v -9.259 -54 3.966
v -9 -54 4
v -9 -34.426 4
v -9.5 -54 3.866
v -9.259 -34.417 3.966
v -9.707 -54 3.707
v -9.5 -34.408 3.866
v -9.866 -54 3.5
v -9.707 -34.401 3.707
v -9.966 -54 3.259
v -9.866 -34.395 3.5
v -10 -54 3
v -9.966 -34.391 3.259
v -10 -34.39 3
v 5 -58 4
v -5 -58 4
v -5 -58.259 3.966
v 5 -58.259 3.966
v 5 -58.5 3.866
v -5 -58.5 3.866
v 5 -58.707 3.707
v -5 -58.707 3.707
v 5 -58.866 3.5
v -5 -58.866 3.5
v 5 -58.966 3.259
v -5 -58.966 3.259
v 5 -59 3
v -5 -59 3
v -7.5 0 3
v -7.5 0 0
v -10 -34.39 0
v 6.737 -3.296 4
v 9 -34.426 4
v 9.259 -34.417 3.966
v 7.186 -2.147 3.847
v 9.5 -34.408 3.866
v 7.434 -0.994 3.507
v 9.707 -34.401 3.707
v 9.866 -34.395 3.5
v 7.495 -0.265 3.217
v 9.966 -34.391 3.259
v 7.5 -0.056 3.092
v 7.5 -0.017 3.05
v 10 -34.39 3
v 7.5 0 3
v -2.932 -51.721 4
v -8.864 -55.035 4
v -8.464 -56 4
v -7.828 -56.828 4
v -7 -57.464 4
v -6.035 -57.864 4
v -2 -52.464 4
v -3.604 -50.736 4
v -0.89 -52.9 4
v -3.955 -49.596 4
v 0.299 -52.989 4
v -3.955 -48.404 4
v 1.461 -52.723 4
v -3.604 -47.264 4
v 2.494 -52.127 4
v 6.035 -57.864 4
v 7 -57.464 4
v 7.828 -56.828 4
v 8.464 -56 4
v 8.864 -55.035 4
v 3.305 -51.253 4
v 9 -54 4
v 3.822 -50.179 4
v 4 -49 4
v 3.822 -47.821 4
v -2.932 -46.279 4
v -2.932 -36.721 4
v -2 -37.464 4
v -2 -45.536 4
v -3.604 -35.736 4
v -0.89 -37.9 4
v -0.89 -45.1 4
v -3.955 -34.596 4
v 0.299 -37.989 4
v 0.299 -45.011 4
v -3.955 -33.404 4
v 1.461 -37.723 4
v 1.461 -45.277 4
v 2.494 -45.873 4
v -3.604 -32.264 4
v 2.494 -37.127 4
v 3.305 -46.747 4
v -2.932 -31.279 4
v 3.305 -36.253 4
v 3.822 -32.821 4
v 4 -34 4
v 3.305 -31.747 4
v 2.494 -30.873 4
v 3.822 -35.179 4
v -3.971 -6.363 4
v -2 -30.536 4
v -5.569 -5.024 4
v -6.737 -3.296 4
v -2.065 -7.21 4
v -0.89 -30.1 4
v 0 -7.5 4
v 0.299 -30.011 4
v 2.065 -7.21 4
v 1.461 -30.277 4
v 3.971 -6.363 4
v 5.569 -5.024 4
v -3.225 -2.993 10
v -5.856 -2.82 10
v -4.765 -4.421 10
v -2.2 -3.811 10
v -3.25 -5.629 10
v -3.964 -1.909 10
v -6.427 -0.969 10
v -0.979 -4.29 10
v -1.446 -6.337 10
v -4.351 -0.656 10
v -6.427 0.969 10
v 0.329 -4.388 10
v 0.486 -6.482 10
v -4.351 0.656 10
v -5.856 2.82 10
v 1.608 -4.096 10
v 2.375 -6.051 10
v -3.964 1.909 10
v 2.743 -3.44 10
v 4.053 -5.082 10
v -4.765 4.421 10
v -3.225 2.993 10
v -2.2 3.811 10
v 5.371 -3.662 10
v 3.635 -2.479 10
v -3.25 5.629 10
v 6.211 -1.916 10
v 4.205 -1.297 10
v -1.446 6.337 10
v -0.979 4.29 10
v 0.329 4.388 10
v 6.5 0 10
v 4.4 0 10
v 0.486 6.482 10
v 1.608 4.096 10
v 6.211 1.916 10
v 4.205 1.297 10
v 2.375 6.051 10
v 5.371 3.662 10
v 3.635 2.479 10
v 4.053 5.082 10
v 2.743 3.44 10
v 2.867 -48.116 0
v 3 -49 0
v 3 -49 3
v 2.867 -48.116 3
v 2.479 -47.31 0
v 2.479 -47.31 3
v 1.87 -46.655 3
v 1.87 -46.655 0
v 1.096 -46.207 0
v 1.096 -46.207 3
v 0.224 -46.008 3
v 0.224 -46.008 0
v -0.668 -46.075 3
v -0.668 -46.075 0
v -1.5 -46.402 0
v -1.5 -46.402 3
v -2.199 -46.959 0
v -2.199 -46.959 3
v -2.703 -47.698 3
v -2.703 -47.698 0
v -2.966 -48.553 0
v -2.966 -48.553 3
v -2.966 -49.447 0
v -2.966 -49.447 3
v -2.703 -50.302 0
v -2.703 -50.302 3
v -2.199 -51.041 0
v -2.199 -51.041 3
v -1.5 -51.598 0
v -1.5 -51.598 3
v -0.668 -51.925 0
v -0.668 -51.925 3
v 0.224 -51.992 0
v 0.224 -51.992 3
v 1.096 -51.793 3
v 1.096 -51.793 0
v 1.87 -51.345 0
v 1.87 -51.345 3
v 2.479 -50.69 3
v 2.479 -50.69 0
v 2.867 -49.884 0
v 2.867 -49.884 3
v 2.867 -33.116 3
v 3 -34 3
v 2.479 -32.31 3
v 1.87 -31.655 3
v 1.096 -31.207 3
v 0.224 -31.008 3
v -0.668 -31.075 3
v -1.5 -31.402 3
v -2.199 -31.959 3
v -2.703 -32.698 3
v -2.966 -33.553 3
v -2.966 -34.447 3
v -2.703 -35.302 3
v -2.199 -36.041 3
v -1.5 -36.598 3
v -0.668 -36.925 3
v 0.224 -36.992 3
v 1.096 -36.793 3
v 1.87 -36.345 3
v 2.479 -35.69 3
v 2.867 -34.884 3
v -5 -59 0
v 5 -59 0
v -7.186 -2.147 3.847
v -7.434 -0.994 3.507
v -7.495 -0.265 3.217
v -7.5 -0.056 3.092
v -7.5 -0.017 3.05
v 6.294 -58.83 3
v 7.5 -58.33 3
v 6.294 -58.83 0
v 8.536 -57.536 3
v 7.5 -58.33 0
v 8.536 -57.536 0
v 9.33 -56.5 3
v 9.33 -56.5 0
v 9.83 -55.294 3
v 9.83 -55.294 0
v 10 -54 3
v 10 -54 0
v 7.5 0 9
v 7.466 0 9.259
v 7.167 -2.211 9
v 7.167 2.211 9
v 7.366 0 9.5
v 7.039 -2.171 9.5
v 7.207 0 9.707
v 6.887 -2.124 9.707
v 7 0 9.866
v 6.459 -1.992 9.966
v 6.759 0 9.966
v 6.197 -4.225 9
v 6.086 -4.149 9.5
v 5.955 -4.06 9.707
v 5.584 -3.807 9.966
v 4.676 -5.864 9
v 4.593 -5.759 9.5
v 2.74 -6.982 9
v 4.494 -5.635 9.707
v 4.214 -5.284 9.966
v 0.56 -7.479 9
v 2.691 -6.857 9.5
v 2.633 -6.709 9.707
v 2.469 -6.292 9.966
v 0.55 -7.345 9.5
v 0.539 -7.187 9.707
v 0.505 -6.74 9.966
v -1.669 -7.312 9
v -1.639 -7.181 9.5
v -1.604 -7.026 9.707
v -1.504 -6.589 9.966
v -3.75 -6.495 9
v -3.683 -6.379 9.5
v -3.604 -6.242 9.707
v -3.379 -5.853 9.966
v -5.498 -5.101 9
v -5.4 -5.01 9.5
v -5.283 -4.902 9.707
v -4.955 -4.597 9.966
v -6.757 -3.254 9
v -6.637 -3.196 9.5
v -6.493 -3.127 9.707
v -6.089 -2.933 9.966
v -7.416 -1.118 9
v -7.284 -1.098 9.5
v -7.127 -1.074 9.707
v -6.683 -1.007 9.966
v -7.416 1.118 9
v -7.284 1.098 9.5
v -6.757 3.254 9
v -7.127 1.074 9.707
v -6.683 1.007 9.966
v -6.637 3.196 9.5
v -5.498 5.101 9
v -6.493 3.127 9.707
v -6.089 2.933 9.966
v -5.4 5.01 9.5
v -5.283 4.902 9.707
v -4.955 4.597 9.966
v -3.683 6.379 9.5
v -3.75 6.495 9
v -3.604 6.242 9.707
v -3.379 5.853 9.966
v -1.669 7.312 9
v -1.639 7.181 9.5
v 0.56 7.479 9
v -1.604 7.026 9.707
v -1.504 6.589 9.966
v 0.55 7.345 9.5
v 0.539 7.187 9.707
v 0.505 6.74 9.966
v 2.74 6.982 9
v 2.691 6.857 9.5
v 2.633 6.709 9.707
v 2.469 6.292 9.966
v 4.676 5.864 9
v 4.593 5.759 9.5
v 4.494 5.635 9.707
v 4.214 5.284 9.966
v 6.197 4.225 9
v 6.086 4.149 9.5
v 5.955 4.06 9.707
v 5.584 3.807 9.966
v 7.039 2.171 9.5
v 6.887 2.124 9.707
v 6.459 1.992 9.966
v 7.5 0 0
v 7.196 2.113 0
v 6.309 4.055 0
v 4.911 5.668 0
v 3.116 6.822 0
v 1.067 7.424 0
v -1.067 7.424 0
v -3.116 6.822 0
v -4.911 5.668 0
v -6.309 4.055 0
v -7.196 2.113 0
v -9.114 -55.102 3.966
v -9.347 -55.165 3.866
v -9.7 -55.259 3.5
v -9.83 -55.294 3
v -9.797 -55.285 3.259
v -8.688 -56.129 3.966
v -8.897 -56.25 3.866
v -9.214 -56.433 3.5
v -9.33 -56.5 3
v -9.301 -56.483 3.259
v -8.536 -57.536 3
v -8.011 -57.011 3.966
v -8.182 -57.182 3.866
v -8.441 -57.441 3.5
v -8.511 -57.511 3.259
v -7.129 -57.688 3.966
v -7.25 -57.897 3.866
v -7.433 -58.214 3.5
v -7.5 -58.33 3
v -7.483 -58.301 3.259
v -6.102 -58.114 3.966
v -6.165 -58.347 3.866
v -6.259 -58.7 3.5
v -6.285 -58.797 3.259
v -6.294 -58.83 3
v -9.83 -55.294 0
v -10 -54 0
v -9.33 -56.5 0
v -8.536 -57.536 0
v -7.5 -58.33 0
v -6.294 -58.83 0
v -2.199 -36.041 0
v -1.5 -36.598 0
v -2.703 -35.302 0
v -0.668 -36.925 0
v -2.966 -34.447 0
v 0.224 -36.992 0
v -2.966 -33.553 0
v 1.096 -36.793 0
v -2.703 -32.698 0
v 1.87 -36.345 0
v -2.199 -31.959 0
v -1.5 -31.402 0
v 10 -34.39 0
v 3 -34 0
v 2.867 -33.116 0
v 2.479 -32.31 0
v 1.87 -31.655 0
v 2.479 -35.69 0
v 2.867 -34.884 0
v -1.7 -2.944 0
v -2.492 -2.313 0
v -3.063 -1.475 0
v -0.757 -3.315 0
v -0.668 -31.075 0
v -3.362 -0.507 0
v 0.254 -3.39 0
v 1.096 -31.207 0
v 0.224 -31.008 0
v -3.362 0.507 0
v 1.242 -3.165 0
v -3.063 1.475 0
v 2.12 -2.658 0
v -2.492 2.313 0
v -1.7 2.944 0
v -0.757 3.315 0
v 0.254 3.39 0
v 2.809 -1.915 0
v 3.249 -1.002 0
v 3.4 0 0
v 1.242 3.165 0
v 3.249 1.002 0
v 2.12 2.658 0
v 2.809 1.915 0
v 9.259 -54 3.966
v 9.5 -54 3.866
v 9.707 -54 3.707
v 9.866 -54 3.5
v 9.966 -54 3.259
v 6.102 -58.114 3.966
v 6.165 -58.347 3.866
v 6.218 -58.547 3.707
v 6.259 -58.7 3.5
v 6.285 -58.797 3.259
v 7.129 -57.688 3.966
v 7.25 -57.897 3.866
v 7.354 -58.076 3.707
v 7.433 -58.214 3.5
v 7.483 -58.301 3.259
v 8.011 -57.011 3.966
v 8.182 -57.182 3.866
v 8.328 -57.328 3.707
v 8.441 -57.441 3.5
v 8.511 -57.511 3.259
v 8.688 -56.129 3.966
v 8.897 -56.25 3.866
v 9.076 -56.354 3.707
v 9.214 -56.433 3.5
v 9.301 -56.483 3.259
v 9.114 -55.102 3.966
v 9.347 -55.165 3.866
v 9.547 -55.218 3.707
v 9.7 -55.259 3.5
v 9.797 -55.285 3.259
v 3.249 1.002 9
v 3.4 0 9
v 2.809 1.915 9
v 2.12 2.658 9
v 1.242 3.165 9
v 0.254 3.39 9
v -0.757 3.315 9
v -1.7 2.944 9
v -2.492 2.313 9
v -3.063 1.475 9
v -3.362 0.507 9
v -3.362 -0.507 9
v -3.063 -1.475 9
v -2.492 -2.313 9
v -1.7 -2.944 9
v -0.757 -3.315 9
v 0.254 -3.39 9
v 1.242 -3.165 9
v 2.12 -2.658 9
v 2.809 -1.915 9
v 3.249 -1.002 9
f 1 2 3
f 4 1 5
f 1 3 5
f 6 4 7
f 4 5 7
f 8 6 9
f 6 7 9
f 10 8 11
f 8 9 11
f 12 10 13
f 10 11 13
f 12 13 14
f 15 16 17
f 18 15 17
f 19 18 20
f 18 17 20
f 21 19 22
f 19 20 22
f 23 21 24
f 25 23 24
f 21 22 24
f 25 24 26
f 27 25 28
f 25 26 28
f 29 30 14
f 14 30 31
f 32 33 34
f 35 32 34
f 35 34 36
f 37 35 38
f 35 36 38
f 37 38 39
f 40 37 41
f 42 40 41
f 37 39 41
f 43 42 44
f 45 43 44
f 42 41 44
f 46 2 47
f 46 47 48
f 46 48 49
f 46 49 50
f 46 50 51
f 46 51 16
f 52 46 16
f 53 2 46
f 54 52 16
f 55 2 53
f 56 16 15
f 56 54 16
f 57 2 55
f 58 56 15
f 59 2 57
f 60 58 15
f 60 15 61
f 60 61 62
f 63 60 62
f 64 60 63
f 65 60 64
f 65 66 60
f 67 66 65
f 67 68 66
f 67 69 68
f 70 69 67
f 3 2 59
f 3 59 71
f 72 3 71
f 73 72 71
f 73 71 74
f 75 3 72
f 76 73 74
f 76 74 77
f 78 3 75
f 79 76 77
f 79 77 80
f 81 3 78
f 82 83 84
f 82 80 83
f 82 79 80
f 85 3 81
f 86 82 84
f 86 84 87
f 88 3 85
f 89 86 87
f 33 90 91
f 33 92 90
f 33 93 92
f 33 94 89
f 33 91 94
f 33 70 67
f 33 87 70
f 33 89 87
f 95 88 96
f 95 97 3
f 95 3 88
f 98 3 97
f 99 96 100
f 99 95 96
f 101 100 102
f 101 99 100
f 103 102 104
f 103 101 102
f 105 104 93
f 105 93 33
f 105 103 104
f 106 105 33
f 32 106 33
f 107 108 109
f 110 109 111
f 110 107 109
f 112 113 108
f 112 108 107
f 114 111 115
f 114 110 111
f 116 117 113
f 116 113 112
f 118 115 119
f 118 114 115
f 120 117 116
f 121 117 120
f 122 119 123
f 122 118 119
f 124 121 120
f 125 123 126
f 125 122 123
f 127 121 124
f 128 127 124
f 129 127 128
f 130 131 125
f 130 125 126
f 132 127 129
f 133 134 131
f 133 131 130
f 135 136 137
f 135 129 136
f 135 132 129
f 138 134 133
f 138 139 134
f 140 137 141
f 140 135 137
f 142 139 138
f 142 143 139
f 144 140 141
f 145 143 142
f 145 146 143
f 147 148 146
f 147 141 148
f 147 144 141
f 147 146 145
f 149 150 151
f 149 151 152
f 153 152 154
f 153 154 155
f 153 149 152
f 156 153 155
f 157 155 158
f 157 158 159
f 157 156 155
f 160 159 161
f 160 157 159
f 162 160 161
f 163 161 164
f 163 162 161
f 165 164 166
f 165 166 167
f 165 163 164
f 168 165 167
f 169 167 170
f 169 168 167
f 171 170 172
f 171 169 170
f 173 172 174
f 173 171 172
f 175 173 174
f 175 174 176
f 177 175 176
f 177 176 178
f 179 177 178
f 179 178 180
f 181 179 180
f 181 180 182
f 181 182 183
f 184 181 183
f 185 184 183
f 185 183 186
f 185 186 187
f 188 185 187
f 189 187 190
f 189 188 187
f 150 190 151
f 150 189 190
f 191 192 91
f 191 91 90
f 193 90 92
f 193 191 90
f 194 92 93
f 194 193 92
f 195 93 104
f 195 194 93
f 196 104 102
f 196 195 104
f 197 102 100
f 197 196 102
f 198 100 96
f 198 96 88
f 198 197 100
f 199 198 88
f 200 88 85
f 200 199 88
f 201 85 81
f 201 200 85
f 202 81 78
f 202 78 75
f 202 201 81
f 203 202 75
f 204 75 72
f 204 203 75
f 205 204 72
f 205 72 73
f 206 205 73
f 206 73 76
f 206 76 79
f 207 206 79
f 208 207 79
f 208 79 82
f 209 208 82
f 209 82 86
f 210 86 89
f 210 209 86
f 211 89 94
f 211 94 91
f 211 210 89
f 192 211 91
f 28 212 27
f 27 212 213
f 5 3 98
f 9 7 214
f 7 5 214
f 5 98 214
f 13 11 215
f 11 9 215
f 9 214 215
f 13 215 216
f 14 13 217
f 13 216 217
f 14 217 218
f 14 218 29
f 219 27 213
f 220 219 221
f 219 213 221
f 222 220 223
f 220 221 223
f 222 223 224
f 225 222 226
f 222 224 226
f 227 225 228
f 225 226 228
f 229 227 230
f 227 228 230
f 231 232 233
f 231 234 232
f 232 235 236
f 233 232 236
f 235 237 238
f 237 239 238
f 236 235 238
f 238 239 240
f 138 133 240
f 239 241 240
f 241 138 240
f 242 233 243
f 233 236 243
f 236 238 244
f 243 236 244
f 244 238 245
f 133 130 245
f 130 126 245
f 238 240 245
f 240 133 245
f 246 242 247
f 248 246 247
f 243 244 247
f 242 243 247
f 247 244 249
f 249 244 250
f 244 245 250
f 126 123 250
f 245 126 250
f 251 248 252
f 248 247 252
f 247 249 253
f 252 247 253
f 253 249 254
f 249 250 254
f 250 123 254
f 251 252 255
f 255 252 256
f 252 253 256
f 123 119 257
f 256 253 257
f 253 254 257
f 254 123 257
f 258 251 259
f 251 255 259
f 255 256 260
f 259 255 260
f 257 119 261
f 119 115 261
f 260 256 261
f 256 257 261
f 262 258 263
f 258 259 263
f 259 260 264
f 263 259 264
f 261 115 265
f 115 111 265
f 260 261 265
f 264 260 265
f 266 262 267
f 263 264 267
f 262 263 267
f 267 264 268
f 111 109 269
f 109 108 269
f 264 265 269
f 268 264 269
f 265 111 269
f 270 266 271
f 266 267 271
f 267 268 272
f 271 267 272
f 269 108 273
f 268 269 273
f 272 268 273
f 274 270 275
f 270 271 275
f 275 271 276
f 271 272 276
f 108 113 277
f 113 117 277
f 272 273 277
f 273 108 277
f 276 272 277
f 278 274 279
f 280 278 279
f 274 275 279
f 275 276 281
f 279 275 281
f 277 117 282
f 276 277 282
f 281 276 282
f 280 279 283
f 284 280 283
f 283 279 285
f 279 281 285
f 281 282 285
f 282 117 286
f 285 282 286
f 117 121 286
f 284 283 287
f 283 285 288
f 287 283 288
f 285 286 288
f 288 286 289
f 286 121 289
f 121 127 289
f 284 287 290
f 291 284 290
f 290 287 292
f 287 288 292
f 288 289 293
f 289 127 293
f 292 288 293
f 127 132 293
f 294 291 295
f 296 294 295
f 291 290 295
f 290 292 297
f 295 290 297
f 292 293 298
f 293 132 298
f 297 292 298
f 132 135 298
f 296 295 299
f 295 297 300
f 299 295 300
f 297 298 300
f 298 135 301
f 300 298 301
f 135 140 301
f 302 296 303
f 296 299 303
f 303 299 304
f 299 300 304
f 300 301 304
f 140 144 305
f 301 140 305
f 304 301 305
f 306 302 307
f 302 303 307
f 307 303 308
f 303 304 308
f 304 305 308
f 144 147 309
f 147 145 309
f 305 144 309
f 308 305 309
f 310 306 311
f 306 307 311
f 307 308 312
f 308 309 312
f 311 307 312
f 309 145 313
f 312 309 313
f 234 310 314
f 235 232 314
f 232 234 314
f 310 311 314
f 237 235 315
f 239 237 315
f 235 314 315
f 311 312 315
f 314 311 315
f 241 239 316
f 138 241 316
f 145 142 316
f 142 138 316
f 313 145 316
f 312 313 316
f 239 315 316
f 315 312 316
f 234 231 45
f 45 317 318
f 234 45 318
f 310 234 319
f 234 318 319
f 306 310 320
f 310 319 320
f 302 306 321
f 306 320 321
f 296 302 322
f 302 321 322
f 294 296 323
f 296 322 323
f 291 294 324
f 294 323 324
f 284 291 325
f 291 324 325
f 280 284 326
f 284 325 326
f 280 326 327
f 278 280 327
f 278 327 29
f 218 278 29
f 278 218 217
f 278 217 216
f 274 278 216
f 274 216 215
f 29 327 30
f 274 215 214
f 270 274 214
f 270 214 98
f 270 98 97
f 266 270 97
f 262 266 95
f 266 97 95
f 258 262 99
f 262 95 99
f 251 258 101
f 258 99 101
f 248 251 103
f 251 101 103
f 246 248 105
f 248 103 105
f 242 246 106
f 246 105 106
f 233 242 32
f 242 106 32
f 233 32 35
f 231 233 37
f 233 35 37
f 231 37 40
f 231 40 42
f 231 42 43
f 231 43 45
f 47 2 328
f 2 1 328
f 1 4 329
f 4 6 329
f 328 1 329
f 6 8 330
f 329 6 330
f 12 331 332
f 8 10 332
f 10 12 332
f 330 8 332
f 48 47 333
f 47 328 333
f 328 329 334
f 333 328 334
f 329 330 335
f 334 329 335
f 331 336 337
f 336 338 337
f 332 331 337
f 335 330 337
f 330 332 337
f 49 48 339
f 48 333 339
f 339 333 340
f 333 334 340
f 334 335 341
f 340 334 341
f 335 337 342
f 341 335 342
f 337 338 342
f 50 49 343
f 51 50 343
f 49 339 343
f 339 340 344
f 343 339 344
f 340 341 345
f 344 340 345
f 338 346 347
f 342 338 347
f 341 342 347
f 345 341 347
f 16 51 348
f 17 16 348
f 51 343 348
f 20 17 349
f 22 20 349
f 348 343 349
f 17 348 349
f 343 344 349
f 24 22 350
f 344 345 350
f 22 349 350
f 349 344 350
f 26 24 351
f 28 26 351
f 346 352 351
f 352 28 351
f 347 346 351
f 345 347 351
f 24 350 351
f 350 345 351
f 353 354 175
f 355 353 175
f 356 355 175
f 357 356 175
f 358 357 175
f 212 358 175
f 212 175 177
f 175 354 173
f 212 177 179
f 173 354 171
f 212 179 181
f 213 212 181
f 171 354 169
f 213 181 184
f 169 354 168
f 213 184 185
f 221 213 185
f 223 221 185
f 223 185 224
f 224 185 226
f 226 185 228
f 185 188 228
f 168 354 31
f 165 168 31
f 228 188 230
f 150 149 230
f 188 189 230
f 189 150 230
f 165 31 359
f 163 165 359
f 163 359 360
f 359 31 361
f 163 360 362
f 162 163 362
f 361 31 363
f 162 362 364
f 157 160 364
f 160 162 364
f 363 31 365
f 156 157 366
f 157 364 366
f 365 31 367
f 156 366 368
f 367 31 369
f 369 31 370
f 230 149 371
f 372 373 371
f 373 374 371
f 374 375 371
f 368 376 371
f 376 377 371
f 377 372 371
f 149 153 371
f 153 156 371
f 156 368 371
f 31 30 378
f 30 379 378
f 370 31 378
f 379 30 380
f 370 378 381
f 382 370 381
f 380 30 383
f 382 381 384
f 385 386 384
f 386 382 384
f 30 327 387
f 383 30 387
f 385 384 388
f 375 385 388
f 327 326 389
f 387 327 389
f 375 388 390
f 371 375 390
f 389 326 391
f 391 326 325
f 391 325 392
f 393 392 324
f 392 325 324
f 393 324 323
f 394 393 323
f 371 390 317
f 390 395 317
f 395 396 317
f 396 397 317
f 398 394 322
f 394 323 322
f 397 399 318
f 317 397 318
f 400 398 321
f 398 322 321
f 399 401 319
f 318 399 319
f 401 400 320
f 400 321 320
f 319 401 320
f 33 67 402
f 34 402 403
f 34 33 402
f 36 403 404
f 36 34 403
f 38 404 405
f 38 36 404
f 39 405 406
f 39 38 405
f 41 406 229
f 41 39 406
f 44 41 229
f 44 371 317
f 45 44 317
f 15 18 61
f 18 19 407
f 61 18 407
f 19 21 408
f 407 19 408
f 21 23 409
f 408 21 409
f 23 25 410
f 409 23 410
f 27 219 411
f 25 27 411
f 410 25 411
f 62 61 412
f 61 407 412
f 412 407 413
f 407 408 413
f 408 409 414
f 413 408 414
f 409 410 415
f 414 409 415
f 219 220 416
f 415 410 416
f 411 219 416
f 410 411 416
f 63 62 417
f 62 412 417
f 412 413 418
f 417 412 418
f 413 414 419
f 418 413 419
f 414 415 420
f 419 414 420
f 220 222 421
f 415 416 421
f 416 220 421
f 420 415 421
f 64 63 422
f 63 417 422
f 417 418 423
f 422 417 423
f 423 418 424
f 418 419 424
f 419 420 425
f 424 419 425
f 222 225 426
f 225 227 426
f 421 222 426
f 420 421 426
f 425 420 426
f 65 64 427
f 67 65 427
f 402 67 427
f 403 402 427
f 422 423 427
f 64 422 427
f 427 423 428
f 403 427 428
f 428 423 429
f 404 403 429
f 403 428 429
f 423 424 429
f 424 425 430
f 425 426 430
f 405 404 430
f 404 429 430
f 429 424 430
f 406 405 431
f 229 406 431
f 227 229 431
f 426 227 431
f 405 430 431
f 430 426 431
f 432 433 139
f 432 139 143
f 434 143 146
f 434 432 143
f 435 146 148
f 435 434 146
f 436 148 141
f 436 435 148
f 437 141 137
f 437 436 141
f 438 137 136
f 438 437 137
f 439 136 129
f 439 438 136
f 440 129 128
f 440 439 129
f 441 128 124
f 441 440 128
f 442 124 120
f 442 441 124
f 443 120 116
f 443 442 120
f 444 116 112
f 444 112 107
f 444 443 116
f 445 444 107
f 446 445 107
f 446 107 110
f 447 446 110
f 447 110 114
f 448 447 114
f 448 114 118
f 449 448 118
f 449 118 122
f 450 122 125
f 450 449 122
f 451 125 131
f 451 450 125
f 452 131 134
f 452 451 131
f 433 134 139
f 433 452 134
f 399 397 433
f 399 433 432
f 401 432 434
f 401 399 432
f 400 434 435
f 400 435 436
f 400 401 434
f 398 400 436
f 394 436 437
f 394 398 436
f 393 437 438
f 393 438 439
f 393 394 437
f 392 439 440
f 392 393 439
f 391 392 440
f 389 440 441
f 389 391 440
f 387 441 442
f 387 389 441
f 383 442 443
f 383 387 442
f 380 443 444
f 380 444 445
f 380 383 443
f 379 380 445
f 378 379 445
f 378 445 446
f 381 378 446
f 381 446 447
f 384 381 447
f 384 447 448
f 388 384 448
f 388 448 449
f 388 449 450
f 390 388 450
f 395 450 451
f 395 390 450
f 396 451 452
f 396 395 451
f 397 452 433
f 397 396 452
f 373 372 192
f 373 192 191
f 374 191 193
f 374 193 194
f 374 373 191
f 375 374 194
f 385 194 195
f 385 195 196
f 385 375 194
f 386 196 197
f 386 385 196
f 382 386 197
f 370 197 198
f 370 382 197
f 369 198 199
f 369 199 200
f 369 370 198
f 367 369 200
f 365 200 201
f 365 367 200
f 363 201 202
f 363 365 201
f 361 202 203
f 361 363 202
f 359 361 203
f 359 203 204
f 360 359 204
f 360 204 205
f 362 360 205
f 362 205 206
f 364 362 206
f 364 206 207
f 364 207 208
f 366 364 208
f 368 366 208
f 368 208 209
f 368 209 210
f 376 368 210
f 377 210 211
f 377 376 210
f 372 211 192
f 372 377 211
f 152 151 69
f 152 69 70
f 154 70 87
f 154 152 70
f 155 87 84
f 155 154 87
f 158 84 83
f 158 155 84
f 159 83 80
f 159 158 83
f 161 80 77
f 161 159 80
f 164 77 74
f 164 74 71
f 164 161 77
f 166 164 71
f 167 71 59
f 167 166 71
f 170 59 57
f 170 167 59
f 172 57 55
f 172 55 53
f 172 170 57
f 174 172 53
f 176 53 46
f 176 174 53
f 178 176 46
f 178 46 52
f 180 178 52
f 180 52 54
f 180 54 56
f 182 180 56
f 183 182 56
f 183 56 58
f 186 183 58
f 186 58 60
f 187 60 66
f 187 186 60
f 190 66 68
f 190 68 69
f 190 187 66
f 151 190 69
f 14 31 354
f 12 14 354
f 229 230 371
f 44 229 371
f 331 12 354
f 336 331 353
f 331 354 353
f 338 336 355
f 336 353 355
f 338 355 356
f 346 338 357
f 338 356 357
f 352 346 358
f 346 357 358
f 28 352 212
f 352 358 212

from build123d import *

# Parameters (mm, degrees)
F0_R         = 3
F1_DEPTH     = 4
F0_R_2       = 3.4
F2_DEPTH     = 10
F3_SIZE      = 1
F4_T1_DEPTH  = 22.1100533903
F4_T3_DEPTH  = 10
F4_T10_DEPTH = 44.4806964521
F4_S11_R     = 7.5
F4_T12_DEPTH = 24
F4_T14_ANGLE = 90
F4_T18_DEPTH = 44.4806964521
F4_S19_R     = 7.5
F4_T20_DEPTH = 24
F4_T22_ANGLE = 90


# Not quite as in the source:
# - a fillet or chamfer that OpenCascade refuses, or shapes differently, is made with other operations: its cross-section is extruded or revolved along the edge and cut away or added


with BuildPart() as f1:
    # F0 (on Top) → F1 (new body)
    with BuildSketch(Plane.XY):
        with BuildLine():
            Line((10, -34.3899466097), (7.5, 0))
            ThreePointArc((7.5, 0), (0, -7.5), (-7.5, 0))
            Line((-7.5, 0), (-10, -34.3899466097))
            Line((-10, -34.3899466097), (-10, -54))
            ThreePointArc((-10, -54), (-8.5355339059, -57.5355339059), (-5, -59))
            Line((-5, -59), (5, -59))
            ThreePointArc((5, -59), (8.5355339059, -57.5355339059), (10, -54))
            Line((10, -54), (10, -34.3899466097))
        make_face()
        with Locations((0, -49)):
            Circle(F0_R, mode=Mode.SUBTRACT)
        with Locations((0, -34)):
            Circle(F0_R, mode=Mode.SUBTRACT)
    extrude(amount=F1_DEPTH)

    # F0 (on Top) → F2 (join)
    with BuildSketch(Plane.XY):
        with BuildLine():
            ThreePointArc((-7.5, 0), (0, -7.5), (7.5, 0))
            ThreePointArc((7.5, 0), (0, 7.5), (-7.5, 0))
        make_face()
        Circle(F0_R_2, mode=Mode.SUBTRACT)
    extrude(amount=F2_DEPTH)

    # F3
    f3_edges = [f1.edges().sort_by_distance(p)[0] for p in [
        (-3, -34, 4),
        (-3, -49, 4),
        (-3.4, 0, 10),
    ]]
    chamfer(f3_edges, length=F3_SIZE)

    # F4: fillet of radius 1 on 5 edges, made by hand

    # F4_s2 → F4_t1 (cut)
    with BuildSketch(Plane.XZ.offset(31.8899466097)):
        with BuildLine():
            ThreePointArc((-9, 4), (-9.7071067812, 3.7071067812), (-10, 3))
            Line((-10, 3), (-10, 4))
            Line((-10, 4), (-9, 4))
        make_face()
        with BuildLine():
            ThreePointArc((9, 4), (9.7071067812, 3.7071067812), (10, 3))
            Line((10, 3), (10, 4))
            Line((10, 4), (9, 4))
        make_face()
    extrude(amount=F4_T1_DEPTH, mode=Mode.SUBTRACT)

    # F4_s4 → F4_t3 (cut)
    with BuildSketch(Plane.YZ.offset(-5)):
        with BuildLine():
            ThreePointArc((-58, 4), (-58.7071067812, 3.7071067812), (-59, 3))
            Line((-59, 3), (-59, 4))
            Line((-59, 4), (-58, 4))
        make_face()
    extrude(amount=F4_T3_DEPTH, mode=Mode.SUBTRACT)

    # F4_s5 → F4_t6 (revolve, cut)
    with BuildSketch(Plane.XZ):
        with BuildLine():
            ThreePointArc((7.5, 9), (7.2071067812, 9.7071067812), (6.5, 10))
            Line((6.5, 10), (7.5, 10))
            Line((7.5, 10), (7.5, 9))
        make_face()
    revolve(axis=Axis((0, 0, 10), (0, 0, -1)), mode=Mode.SUBTRACT)


with BuildPart() as f4_tool8:
    # F4_s9 → F4_t10 (new body)
    with BuildSketch(Plane(origin=(0.5043559293, 6.9379093918, 0), x_dir=(0, 0, 1), z_dir=(-0.072504336, -0.9973680972, 0))):
        with BuildLine():
            ThreePointArc((4, 6.4802607288), (3.7071067812, 7.18736751), (3, 7.4802607288))
            Line((3, 7.4802607288), (4, 7.4802607288))
            Line((4, 7.4802607288), (4, 6.4802607288))
        make_face()
    extrude(amount=F4_T10_DEPTH)

    # F4_s11 → F4_t12 (cut, symmetric)
    with BuildSketch(Plane.XY.offset(3.5)):
        Circle(F4_S11_R)
    extrude(amount=F4_T12_DEPTH, both=True, mode=Mode.SUBTRACT)


with BuildPart() as f1_1:
    add(f1.part)

    # F4_t7: cut F4_tool8
    add(f4_tool8.part, mode=Mode.SUBTRACT)

    # F4_s13 → F4_t14 (revolve, cut)
    with BuildSketch(Plane.XZ.offset(54)):
        with BuildLine():
            ThreePointArc((-9, 4), (-9.7071067812, 3.7071067812), (-10, 3))
            Line((-10, 3), (-10, 4))
            Line((-10, 4), (-9, 4))
        make_face()
    revolve(axis=Axis((-5, -54, 4), (0, 0, 1)), revolution_arc=F4_T14_ANGLE, mode=Mode.SUBTRACT)


with BuildPart() as f4_tool16:
    # F4_s17 → F4_t18 (new body)
    with BuildSketch(Plane(origin=(2.7206874304, -37.4257181897, 0), x_dir=(0, 0, 1), z_dir=(-0.072504336, 0.9973680972, 0))):
        with BuildLine():
            ThreePointArc((4, 6.4802607288), (3.7071067812, 7.18736751), (3, 7.4802607288))
            Line((3, 7.4802607288), (4, 7.4802607288))
            Line((4, 7.4802607288), (4, 6.4802607288))
        make_face()
    extrude(amount=F4_T18_DEPTH)

    # F4_s19 → F4_t20 (cut, symmetric)
    with BuildSketch(Plane.XY.offset(3.5)):
        Circle(F4_S19_R)
    extrude(amount=F4_T20_DEPTH, both=True, mode=Mode.SUBTRACT)


with BuildPart() as f1_2:
    add(f1_1.part)

    # F4_t15: cut F4_tool16
    add(f4_tool16.part, mode=Mode.SUBTRACT)

    # F4_s21 → F4_t22 (revolve, cut)
    with BuildSketch(Plane.YZ.offset(5)):
        with BuildLine():
            ThreePointArc((-58, 4), (-58.7071067812, 3.7071067812), (-59, 3))
            Line((-59, 3), (-59, 4))
            Line((-59, 4), (-58, 4))
        make_face()
    revolve(axis=Axis((5, -54, 4), (0, 0, 1)), revolution_arc=F4_T22_ANGLE, mode=Mode.SUBTRACT)


solid = f1_2.part
